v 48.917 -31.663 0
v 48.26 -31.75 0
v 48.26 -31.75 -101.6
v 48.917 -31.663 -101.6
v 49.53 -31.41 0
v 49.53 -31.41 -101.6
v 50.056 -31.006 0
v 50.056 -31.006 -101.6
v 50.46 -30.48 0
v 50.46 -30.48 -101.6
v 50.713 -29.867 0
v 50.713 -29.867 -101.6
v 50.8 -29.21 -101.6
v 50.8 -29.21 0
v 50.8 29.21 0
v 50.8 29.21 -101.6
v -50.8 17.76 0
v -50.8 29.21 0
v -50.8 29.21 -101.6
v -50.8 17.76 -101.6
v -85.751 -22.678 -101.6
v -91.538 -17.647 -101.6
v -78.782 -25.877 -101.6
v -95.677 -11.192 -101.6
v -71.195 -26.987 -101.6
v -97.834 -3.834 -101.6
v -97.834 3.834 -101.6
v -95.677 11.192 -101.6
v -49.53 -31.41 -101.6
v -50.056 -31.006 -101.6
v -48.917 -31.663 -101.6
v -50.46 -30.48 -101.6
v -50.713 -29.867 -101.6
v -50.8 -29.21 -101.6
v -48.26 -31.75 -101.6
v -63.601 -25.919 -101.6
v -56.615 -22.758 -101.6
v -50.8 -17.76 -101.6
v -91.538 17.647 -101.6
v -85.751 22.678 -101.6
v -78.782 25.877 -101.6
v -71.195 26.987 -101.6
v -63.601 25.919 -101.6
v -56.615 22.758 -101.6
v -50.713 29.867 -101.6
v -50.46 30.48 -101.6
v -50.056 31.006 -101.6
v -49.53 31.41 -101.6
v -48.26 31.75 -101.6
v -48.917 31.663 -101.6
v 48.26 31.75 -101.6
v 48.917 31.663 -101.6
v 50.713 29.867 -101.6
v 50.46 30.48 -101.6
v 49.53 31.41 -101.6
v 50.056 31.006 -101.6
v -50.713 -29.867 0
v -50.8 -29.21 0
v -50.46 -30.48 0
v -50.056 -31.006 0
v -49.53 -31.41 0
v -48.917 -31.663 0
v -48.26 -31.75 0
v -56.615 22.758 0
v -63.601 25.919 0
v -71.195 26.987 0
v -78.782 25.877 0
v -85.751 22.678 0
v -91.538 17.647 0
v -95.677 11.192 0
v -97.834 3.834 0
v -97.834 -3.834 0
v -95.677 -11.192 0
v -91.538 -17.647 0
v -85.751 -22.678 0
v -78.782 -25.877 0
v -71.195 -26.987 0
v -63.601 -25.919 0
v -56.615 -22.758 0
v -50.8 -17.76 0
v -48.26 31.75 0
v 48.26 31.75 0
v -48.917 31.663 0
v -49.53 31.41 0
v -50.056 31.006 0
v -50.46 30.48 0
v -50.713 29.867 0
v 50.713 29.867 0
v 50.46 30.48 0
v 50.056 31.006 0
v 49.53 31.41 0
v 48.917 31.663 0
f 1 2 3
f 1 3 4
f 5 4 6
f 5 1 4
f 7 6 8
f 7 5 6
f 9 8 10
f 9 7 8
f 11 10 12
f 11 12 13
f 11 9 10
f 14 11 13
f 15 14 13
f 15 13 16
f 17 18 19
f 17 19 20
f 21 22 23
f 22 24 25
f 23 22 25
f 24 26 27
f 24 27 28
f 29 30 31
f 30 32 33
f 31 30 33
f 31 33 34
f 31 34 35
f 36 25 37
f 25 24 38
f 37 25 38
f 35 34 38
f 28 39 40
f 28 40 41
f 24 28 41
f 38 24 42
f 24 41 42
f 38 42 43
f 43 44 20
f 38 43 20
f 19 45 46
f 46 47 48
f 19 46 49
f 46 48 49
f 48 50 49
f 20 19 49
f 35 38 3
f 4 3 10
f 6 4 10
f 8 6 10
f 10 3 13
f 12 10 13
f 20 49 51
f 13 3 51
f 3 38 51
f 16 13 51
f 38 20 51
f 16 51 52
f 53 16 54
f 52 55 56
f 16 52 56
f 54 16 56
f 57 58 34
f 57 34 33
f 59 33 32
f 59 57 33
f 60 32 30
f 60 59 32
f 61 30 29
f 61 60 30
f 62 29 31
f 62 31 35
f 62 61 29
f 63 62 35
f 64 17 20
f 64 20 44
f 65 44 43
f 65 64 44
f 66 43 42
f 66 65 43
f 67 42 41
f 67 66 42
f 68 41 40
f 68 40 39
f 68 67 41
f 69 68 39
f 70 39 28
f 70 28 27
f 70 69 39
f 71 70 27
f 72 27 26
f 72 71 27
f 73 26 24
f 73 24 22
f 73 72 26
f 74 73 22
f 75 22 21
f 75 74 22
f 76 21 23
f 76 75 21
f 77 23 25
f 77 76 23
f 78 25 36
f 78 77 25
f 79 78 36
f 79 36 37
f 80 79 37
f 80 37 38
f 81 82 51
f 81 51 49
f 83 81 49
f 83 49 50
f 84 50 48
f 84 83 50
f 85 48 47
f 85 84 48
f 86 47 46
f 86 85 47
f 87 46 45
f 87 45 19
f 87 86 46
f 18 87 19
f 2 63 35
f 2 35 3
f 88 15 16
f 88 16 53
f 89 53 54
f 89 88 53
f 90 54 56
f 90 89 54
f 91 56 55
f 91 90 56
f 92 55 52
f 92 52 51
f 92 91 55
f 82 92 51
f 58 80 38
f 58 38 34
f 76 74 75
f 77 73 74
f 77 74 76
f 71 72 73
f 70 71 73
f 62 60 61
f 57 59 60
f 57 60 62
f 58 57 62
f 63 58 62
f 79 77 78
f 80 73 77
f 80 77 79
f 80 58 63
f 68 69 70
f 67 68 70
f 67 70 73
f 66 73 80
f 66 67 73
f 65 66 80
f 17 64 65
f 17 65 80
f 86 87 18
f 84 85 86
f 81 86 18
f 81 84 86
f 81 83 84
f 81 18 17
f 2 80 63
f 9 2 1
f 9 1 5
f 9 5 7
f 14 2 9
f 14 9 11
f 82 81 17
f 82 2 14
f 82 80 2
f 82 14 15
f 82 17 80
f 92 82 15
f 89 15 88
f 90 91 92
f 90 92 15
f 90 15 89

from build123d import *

# Parameters (mm, degrees)
F1_DEPTH = 101.6


with BuildPart() as f1:
    # F0 (on Top) → F1 (new body)
    with BuildSketch(Plane.XY):
        with BuildLine():
            ThreePointArc((50.8, 29.21), (50.0560512242, 31.0060512242), (48.26, 31.75))
            Line((48.26, 31.75), (-48.26, 31.75))
            ThreePointArc((-48.26, 31.75), (-50.0560512242, 31.0060512242), (-50.8, 29.21))
            Line((-50.8, 29.21), (-50.8, 17.7601451641))
            ThreePointArc((-50.8, 17.7601451641), (-45.8543003634, 9.4852294714), (-44.1325, 0))
            ThreePointArc((-44.1325, 0), (-45.8543003634, -9.4852294714), (-50.8, -17.7601451641))
            Line((-50.8, -17.7601451641), (-50.8, -29.21))
            ThreePointArc((-50.8, -29.21), (-50.0560512242, -31.0060512242), (-48.26, -31.75))
            Line((-48.26, -31.75), (48.26, -31.75))
            ThreePointArc((48.26, -31.75), (50.0560512242, -31.0060512242), (50.8, -29.21))
            Line((50.8, -29.21), (50.8, 29.21))
        make_face()
        with BuildLine():
            ThreePointArc((-44.1325, 0), (-45.8543003634, 9.4852294714), (-50.8, 17.7601451641))
            Line((-50.8, 17.7601451641), (-50.8, -17.7601451641))
            ThreePointArc((-50.8, -17.7601451641), (-45.8543003634, -9.4852294714), (-44.1325, 0))
        make_face()
        with BuildLine():
            Line((-50.8, -17.7601451641), (-50.8, 17.7601451641))
            ThreePointArc((-50.8, 17.7601451641), (-98.1075, 0), (-50.8, -17.7601451641))
        make_face()
    extrude(amount=-F1_DEPTH)


solid = f1.part
